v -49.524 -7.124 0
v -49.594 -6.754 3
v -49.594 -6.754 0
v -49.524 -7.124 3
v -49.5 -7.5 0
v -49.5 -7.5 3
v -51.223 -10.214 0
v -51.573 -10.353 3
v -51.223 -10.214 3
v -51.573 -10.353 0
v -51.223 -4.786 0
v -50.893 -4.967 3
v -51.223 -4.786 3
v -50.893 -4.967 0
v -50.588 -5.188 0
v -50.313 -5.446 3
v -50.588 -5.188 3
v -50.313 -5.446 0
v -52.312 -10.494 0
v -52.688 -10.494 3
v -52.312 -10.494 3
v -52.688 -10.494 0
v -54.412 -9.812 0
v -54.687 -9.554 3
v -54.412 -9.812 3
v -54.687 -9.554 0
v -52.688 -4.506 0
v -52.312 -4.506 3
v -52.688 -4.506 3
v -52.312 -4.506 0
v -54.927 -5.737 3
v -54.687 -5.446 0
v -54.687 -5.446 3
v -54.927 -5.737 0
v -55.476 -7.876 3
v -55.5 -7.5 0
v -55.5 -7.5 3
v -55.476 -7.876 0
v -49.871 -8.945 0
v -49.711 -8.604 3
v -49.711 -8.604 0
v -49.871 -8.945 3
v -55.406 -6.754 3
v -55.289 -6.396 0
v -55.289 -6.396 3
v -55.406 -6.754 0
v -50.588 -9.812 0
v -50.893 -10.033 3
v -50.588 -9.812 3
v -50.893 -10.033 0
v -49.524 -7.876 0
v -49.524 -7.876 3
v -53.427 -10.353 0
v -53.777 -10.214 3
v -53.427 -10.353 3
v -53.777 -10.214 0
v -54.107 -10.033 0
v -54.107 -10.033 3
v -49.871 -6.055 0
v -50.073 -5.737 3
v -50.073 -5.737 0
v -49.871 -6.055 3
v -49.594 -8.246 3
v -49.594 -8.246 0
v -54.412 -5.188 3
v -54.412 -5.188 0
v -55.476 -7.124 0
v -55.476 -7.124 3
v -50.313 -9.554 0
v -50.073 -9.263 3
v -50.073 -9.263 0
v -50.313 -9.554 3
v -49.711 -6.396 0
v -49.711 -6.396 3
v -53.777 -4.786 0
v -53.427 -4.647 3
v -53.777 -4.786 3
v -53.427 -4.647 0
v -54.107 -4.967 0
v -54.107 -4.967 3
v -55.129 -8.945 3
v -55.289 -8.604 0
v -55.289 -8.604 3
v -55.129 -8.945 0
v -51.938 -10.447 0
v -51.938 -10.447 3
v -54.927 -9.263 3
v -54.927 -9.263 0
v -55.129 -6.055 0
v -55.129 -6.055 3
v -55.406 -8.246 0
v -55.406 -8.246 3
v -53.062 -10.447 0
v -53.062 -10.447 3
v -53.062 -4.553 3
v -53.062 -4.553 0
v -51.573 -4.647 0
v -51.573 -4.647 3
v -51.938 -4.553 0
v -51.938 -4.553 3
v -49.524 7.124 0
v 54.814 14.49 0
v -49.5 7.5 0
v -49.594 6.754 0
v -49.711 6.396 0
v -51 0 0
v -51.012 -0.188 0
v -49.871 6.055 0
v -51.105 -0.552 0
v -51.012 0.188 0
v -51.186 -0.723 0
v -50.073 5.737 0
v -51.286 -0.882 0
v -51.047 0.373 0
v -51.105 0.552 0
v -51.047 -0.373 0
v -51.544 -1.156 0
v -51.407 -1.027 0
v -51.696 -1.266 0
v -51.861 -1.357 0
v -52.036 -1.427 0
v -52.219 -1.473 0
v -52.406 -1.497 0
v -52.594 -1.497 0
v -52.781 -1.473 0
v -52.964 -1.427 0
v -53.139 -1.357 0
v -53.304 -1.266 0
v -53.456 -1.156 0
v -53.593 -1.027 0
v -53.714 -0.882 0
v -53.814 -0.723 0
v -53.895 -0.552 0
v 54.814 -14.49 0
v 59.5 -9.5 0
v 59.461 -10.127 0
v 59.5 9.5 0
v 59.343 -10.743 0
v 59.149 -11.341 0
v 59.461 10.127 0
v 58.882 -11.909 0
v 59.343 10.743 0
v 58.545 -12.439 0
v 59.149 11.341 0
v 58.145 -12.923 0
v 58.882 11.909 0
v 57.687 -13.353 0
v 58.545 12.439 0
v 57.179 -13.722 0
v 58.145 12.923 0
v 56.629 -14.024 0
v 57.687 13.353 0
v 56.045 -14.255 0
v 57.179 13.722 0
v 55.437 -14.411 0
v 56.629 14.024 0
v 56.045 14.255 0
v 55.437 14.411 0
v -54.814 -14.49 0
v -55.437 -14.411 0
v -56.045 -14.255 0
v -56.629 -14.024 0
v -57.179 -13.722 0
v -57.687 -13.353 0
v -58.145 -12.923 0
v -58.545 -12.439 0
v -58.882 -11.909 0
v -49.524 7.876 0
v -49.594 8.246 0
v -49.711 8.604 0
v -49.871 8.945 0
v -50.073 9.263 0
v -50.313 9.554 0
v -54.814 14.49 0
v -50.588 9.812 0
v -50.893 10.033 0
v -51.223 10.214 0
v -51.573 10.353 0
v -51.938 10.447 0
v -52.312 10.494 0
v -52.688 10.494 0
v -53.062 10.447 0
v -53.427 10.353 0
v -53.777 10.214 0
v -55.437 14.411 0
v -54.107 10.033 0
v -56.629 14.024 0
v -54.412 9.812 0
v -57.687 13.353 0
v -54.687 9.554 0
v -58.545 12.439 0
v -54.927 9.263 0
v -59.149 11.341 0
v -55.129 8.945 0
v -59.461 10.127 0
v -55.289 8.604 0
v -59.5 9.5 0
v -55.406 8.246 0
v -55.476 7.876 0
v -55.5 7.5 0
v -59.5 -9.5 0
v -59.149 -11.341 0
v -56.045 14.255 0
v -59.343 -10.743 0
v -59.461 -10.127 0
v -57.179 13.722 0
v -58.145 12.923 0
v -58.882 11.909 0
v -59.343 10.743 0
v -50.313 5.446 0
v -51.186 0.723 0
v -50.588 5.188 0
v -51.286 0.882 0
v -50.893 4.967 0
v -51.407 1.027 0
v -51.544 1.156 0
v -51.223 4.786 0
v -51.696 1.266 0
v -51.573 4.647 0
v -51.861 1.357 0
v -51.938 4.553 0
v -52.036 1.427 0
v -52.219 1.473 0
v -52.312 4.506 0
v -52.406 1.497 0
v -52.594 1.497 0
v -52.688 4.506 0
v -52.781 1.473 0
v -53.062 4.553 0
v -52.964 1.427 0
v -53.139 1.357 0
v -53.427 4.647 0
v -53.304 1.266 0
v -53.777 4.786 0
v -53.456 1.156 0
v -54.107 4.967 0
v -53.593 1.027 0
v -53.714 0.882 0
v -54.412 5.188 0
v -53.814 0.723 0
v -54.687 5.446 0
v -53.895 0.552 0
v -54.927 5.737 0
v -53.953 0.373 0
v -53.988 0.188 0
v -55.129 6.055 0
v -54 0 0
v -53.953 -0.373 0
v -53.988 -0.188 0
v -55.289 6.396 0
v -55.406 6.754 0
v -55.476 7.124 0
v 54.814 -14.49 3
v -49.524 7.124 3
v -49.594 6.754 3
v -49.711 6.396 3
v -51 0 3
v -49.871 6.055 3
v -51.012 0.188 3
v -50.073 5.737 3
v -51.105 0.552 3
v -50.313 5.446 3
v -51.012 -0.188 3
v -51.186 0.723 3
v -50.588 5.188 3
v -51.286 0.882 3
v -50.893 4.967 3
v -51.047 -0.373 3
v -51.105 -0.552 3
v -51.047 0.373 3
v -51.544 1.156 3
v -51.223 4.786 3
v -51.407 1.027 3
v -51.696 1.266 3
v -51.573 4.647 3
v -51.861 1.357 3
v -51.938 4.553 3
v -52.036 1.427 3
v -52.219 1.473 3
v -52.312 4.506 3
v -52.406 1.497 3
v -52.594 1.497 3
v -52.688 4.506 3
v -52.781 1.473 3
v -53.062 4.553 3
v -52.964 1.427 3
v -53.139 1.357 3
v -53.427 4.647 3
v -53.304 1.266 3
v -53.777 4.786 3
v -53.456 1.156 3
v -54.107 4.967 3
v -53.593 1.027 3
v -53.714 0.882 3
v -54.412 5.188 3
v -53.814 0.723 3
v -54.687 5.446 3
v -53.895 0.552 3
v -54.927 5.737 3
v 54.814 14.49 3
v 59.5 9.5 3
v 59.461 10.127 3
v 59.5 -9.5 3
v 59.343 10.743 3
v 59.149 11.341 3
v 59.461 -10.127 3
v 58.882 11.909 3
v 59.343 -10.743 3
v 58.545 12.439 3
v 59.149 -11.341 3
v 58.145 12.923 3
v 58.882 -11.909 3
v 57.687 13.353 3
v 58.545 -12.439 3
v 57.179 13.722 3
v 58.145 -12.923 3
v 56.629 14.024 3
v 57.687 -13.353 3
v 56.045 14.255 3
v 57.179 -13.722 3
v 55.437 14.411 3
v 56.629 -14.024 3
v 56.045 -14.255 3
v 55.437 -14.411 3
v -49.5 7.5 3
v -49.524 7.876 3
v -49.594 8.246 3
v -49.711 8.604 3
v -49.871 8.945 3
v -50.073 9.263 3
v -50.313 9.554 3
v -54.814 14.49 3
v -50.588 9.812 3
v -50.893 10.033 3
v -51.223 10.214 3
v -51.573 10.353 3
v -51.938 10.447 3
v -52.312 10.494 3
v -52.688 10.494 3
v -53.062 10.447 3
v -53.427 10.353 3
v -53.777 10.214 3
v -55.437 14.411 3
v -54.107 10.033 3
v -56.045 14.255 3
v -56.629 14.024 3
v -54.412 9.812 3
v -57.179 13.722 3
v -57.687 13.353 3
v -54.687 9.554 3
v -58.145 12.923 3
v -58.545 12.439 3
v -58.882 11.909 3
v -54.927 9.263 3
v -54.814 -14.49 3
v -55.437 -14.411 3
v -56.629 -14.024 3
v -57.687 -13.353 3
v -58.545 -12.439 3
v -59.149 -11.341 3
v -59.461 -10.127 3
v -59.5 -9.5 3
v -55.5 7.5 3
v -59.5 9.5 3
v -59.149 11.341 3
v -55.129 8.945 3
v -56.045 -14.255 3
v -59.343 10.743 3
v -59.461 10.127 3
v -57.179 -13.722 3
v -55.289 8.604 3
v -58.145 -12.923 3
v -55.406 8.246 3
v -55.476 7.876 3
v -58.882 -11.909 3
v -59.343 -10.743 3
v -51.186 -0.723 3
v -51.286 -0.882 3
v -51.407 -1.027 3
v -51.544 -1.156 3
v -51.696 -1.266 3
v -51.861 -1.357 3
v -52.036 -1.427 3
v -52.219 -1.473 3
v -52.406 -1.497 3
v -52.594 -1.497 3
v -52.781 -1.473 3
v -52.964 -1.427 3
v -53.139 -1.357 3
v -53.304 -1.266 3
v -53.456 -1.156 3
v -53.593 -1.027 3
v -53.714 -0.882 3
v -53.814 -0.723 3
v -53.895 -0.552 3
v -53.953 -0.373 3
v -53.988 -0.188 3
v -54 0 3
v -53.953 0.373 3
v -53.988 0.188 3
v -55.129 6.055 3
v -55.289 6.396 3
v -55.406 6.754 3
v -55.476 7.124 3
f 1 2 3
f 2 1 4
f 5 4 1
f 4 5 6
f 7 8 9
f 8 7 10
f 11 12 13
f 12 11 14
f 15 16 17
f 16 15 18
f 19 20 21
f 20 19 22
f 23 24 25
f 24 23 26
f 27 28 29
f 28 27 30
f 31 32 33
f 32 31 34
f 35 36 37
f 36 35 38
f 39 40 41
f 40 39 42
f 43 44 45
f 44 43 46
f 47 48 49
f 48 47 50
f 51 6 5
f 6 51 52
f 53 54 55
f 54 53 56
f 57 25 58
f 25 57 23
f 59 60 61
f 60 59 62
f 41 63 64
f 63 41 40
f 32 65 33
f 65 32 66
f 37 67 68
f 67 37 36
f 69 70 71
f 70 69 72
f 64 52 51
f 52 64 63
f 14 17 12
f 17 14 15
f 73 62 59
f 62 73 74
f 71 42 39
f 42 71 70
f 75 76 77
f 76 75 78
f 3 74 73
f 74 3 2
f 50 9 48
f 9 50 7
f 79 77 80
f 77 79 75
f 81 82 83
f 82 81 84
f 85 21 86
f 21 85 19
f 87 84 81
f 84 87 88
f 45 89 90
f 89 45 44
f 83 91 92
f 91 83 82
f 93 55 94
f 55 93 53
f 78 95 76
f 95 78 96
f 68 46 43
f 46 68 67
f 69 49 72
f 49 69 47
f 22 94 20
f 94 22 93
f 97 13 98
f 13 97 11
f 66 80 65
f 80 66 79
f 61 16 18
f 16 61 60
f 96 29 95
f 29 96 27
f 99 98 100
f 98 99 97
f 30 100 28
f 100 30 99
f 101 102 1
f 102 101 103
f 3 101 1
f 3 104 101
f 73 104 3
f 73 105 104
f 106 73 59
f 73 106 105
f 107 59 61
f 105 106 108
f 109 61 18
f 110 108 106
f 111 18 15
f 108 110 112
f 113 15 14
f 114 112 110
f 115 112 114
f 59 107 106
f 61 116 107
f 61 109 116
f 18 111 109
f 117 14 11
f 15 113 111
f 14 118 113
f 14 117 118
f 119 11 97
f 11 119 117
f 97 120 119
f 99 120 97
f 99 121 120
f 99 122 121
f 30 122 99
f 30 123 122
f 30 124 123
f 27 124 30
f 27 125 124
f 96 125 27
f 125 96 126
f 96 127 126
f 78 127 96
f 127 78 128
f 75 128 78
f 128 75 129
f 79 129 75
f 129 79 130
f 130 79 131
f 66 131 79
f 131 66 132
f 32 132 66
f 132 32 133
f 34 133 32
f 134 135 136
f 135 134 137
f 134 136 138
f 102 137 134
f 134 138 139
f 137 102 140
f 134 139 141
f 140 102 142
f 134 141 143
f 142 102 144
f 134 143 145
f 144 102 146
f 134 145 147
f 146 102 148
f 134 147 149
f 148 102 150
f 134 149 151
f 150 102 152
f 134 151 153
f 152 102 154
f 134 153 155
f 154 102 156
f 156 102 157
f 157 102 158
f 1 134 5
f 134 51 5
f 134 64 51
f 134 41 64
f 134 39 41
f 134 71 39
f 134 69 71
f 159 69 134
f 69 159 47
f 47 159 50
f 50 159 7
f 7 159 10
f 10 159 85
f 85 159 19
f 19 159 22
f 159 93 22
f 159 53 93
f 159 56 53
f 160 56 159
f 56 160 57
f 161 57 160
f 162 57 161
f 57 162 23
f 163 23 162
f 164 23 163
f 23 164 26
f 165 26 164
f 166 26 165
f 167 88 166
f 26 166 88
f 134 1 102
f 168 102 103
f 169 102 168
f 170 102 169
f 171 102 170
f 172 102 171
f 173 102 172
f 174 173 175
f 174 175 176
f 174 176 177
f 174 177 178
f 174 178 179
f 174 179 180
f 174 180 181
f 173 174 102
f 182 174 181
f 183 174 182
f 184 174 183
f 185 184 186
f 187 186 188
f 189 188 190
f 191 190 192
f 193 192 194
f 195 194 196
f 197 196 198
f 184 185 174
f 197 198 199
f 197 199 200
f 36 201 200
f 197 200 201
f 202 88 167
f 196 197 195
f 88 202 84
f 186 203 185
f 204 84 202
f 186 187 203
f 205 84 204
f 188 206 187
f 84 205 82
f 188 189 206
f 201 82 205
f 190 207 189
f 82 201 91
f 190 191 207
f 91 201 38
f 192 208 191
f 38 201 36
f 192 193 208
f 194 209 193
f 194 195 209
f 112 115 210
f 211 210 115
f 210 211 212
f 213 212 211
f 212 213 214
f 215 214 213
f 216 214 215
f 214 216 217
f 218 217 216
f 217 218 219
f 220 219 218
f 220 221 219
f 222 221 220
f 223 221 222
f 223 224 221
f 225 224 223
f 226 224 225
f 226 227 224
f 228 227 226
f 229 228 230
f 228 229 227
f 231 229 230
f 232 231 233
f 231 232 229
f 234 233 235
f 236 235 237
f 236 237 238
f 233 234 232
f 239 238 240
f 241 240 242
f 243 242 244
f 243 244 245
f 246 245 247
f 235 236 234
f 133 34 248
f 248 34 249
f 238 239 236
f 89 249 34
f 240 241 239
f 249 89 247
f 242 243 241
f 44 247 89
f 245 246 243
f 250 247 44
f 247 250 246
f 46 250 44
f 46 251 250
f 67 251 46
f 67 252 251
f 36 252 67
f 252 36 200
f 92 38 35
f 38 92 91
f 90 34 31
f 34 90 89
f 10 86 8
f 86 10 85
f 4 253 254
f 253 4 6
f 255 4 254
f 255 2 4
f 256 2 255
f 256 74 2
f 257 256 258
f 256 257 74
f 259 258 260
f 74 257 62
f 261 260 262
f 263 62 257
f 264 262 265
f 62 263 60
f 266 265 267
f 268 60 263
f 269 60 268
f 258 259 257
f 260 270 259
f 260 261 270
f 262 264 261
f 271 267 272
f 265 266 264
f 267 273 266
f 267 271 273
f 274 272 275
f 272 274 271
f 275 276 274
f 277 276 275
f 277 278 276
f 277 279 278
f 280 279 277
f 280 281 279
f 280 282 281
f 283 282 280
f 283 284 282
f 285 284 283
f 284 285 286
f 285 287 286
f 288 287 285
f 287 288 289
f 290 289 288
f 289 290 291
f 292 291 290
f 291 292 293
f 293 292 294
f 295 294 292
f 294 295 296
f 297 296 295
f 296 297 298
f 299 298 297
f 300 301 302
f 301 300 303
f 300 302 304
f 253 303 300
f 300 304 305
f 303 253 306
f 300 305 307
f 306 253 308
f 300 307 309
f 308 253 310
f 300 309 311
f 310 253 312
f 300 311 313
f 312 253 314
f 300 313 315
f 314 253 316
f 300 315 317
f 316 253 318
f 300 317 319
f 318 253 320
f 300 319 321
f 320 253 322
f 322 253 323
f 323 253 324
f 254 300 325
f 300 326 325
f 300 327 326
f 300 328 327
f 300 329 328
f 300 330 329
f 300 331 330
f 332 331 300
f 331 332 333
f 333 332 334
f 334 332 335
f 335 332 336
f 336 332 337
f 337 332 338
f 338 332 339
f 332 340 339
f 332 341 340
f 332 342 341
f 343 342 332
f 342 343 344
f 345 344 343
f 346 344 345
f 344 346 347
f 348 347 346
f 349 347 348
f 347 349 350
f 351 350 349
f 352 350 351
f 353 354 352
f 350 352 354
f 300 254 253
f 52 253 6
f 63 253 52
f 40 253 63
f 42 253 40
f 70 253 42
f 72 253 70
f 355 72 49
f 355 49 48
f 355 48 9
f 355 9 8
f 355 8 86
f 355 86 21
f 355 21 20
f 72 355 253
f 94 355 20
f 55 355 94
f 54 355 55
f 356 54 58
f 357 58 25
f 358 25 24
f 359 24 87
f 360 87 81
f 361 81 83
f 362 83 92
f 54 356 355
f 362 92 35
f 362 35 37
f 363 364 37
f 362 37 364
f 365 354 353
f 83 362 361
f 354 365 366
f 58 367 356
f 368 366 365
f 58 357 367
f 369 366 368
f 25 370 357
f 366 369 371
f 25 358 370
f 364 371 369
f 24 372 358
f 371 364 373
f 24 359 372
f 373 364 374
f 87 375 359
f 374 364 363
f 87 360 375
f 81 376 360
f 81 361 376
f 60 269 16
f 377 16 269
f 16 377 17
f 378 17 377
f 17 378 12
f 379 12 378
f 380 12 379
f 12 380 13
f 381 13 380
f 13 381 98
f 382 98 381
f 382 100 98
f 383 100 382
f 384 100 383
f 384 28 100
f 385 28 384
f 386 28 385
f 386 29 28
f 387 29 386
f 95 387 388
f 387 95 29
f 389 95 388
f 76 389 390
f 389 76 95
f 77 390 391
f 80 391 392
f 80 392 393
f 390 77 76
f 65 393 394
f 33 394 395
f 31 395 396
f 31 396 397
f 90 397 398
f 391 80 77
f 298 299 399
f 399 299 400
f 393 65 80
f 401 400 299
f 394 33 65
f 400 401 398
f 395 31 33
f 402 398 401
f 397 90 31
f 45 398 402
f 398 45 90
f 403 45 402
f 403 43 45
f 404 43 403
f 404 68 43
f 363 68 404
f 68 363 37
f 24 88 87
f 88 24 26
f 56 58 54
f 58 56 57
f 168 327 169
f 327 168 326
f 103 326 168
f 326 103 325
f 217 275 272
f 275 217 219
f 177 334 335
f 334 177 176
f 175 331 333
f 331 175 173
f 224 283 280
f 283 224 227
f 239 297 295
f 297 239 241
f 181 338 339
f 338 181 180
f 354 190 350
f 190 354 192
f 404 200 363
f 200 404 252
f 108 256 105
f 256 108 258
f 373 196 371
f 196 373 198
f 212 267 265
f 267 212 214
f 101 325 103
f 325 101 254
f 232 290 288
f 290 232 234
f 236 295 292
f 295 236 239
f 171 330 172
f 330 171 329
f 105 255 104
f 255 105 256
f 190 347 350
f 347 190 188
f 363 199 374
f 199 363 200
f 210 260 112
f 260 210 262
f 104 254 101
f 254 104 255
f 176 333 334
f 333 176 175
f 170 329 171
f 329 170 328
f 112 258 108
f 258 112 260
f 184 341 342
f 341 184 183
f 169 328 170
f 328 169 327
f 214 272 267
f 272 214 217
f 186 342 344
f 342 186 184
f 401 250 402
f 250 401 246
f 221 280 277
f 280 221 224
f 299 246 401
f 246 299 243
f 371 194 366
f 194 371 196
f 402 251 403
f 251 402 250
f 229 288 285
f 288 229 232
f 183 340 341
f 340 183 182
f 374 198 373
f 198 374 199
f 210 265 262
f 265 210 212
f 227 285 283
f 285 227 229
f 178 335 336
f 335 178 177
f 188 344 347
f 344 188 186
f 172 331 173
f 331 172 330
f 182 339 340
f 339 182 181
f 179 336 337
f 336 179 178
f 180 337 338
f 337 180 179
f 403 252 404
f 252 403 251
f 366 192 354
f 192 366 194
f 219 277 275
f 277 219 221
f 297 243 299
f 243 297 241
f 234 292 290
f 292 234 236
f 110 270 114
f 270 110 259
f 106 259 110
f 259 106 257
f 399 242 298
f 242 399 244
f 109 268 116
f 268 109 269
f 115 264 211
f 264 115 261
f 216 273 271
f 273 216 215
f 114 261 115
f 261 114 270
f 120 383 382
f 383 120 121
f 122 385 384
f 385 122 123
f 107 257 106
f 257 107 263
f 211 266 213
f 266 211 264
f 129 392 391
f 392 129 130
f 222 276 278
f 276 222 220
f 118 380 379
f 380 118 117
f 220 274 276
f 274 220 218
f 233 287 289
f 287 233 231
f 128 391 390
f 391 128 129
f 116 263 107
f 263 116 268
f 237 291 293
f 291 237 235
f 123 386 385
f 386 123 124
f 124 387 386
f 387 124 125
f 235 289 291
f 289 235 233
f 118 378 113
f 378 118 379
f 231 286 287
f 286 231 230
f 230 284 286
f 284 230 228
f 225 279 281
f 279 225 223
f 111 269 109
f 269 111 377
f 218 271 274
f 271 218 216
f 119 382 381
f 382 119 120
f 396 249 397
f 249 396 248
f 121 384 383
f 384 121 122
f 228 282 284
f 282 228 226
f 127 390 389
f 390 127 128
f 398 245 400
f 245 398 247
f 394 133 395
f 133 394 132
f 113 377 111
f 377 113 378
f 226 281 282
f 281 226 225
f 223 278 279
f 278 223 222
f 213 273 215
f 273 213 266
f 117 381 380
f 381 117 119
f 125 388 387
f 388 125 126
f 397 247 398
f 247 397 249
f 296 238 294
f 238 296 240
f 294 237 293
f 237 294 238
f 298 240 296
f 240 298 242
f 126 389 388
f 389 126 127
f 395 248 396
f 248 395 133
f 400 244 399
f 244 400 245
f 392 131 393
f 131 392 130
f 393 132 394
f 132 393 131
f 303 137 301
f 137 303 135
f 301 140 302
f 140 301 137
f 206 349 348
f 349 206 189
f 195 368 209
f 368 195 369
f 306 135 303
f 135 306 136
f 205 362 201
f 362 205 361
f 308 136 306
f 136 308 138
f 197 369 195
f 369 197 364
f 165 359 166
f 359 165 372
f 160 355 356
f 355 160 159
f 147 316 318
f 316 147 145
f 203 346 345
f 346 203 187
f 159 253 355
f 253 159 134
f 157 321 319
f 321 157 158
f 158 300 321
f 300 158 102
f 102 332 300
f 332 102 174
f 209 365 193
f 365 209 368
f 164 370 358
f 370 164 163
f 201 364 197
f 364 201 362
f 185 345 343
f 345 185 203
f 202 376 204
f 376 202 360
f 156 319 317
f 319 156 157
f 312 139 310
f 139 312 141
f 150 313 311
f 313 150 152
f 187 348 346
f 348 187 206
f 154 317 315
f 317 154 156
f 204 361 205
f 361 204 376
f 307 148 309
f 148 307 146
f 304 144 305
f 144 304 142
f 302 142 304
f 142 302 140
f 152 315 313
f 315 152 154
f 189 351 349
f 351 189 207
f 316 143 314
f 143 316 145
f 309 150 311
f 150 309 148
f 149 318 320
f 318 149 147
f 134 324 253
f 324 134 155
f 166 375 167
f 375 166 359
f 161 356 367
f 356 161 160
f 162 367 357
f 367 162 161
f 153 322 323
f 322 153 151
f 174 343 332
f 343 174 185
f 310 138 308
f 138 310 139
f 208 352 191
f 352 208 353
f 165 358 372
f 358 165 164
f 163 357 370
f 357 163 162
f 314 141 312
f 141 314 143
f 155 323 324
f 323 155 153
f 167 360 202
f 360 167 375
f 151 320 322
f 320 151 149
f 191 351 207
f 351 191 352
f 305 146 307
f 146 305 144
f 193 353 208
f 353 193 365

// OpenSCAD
$fn = 50;


difference() {
	union() {
		hull() {
			translate(v = [-54.5000000000, 9.5000000000, 0]) {
				cylinder(h = 3, r = 5);
			}
			translate(v = [54.5000000000, 9.5000000000, 0]) {
				cylinder(h = 3, r = 5);
			}
			translate(v = [-54.5000000000, -9.5000000000, 0]) {
				cylinder(h = 3, r = 5);
			}
			translate(v = [54.5000000000, -9.5000000000, 0]) {
				cylinder(h = 3, r = 5);
			}
		}
	}
	union() {
		translate(v = [-52.5000000000, -7.5000000000, 0]) {
			cylinder(h = 3, r = 3.0000000000);
		}
		translate(v = [-52.5000000000, 7.5000000000, 0]) {
			cylinder(h = 3, r = 3.0000000000);
		}
		translate(v = [-52.5000000000, -7.5000000000, 0]) {
			cylinder(h = 3, r = 1.5000000000);
		}
		translate(v = [-52.5000000000, 0.0000000000, 0]) {
			cylinder(h = 3, r = 1.5000000000);
		}
		translate(v = [-52.5000000000, 7.5000000000, 0]) {
			cylinder(h = 3, r = 1.5000000000);
		}
		translate(v = [-52.5000000000, -7.5000000000, 0]) {
			cylinder(h = 3, r = 1.5000000000);
		}
		translate(v = [-52.5000000000, 0.0000000000, 0]) {
			cylinder(h = 3, r = 1.5000000000);
		}
		translate(v = [-52.5000000000, 7.5000000000, 0]) {
			cylinder(h = 3, r = 1.5000000000);
		}
		translate(v = [-52.5000000000, -7.5000000000, 0]) {
			cylinder(h = 3, r = 1.5000000000);
		}
		translate(v = [-52.5000000000, 0.0000000000, 0]) {
			cylinder(h = 3, r = 1.5000000000);
		}
		translate(v = [-52.5000000000, 7.5000000000, 0]) {
			cylinder(h = 3, r = 1.5000000000);
		}
	}
}
